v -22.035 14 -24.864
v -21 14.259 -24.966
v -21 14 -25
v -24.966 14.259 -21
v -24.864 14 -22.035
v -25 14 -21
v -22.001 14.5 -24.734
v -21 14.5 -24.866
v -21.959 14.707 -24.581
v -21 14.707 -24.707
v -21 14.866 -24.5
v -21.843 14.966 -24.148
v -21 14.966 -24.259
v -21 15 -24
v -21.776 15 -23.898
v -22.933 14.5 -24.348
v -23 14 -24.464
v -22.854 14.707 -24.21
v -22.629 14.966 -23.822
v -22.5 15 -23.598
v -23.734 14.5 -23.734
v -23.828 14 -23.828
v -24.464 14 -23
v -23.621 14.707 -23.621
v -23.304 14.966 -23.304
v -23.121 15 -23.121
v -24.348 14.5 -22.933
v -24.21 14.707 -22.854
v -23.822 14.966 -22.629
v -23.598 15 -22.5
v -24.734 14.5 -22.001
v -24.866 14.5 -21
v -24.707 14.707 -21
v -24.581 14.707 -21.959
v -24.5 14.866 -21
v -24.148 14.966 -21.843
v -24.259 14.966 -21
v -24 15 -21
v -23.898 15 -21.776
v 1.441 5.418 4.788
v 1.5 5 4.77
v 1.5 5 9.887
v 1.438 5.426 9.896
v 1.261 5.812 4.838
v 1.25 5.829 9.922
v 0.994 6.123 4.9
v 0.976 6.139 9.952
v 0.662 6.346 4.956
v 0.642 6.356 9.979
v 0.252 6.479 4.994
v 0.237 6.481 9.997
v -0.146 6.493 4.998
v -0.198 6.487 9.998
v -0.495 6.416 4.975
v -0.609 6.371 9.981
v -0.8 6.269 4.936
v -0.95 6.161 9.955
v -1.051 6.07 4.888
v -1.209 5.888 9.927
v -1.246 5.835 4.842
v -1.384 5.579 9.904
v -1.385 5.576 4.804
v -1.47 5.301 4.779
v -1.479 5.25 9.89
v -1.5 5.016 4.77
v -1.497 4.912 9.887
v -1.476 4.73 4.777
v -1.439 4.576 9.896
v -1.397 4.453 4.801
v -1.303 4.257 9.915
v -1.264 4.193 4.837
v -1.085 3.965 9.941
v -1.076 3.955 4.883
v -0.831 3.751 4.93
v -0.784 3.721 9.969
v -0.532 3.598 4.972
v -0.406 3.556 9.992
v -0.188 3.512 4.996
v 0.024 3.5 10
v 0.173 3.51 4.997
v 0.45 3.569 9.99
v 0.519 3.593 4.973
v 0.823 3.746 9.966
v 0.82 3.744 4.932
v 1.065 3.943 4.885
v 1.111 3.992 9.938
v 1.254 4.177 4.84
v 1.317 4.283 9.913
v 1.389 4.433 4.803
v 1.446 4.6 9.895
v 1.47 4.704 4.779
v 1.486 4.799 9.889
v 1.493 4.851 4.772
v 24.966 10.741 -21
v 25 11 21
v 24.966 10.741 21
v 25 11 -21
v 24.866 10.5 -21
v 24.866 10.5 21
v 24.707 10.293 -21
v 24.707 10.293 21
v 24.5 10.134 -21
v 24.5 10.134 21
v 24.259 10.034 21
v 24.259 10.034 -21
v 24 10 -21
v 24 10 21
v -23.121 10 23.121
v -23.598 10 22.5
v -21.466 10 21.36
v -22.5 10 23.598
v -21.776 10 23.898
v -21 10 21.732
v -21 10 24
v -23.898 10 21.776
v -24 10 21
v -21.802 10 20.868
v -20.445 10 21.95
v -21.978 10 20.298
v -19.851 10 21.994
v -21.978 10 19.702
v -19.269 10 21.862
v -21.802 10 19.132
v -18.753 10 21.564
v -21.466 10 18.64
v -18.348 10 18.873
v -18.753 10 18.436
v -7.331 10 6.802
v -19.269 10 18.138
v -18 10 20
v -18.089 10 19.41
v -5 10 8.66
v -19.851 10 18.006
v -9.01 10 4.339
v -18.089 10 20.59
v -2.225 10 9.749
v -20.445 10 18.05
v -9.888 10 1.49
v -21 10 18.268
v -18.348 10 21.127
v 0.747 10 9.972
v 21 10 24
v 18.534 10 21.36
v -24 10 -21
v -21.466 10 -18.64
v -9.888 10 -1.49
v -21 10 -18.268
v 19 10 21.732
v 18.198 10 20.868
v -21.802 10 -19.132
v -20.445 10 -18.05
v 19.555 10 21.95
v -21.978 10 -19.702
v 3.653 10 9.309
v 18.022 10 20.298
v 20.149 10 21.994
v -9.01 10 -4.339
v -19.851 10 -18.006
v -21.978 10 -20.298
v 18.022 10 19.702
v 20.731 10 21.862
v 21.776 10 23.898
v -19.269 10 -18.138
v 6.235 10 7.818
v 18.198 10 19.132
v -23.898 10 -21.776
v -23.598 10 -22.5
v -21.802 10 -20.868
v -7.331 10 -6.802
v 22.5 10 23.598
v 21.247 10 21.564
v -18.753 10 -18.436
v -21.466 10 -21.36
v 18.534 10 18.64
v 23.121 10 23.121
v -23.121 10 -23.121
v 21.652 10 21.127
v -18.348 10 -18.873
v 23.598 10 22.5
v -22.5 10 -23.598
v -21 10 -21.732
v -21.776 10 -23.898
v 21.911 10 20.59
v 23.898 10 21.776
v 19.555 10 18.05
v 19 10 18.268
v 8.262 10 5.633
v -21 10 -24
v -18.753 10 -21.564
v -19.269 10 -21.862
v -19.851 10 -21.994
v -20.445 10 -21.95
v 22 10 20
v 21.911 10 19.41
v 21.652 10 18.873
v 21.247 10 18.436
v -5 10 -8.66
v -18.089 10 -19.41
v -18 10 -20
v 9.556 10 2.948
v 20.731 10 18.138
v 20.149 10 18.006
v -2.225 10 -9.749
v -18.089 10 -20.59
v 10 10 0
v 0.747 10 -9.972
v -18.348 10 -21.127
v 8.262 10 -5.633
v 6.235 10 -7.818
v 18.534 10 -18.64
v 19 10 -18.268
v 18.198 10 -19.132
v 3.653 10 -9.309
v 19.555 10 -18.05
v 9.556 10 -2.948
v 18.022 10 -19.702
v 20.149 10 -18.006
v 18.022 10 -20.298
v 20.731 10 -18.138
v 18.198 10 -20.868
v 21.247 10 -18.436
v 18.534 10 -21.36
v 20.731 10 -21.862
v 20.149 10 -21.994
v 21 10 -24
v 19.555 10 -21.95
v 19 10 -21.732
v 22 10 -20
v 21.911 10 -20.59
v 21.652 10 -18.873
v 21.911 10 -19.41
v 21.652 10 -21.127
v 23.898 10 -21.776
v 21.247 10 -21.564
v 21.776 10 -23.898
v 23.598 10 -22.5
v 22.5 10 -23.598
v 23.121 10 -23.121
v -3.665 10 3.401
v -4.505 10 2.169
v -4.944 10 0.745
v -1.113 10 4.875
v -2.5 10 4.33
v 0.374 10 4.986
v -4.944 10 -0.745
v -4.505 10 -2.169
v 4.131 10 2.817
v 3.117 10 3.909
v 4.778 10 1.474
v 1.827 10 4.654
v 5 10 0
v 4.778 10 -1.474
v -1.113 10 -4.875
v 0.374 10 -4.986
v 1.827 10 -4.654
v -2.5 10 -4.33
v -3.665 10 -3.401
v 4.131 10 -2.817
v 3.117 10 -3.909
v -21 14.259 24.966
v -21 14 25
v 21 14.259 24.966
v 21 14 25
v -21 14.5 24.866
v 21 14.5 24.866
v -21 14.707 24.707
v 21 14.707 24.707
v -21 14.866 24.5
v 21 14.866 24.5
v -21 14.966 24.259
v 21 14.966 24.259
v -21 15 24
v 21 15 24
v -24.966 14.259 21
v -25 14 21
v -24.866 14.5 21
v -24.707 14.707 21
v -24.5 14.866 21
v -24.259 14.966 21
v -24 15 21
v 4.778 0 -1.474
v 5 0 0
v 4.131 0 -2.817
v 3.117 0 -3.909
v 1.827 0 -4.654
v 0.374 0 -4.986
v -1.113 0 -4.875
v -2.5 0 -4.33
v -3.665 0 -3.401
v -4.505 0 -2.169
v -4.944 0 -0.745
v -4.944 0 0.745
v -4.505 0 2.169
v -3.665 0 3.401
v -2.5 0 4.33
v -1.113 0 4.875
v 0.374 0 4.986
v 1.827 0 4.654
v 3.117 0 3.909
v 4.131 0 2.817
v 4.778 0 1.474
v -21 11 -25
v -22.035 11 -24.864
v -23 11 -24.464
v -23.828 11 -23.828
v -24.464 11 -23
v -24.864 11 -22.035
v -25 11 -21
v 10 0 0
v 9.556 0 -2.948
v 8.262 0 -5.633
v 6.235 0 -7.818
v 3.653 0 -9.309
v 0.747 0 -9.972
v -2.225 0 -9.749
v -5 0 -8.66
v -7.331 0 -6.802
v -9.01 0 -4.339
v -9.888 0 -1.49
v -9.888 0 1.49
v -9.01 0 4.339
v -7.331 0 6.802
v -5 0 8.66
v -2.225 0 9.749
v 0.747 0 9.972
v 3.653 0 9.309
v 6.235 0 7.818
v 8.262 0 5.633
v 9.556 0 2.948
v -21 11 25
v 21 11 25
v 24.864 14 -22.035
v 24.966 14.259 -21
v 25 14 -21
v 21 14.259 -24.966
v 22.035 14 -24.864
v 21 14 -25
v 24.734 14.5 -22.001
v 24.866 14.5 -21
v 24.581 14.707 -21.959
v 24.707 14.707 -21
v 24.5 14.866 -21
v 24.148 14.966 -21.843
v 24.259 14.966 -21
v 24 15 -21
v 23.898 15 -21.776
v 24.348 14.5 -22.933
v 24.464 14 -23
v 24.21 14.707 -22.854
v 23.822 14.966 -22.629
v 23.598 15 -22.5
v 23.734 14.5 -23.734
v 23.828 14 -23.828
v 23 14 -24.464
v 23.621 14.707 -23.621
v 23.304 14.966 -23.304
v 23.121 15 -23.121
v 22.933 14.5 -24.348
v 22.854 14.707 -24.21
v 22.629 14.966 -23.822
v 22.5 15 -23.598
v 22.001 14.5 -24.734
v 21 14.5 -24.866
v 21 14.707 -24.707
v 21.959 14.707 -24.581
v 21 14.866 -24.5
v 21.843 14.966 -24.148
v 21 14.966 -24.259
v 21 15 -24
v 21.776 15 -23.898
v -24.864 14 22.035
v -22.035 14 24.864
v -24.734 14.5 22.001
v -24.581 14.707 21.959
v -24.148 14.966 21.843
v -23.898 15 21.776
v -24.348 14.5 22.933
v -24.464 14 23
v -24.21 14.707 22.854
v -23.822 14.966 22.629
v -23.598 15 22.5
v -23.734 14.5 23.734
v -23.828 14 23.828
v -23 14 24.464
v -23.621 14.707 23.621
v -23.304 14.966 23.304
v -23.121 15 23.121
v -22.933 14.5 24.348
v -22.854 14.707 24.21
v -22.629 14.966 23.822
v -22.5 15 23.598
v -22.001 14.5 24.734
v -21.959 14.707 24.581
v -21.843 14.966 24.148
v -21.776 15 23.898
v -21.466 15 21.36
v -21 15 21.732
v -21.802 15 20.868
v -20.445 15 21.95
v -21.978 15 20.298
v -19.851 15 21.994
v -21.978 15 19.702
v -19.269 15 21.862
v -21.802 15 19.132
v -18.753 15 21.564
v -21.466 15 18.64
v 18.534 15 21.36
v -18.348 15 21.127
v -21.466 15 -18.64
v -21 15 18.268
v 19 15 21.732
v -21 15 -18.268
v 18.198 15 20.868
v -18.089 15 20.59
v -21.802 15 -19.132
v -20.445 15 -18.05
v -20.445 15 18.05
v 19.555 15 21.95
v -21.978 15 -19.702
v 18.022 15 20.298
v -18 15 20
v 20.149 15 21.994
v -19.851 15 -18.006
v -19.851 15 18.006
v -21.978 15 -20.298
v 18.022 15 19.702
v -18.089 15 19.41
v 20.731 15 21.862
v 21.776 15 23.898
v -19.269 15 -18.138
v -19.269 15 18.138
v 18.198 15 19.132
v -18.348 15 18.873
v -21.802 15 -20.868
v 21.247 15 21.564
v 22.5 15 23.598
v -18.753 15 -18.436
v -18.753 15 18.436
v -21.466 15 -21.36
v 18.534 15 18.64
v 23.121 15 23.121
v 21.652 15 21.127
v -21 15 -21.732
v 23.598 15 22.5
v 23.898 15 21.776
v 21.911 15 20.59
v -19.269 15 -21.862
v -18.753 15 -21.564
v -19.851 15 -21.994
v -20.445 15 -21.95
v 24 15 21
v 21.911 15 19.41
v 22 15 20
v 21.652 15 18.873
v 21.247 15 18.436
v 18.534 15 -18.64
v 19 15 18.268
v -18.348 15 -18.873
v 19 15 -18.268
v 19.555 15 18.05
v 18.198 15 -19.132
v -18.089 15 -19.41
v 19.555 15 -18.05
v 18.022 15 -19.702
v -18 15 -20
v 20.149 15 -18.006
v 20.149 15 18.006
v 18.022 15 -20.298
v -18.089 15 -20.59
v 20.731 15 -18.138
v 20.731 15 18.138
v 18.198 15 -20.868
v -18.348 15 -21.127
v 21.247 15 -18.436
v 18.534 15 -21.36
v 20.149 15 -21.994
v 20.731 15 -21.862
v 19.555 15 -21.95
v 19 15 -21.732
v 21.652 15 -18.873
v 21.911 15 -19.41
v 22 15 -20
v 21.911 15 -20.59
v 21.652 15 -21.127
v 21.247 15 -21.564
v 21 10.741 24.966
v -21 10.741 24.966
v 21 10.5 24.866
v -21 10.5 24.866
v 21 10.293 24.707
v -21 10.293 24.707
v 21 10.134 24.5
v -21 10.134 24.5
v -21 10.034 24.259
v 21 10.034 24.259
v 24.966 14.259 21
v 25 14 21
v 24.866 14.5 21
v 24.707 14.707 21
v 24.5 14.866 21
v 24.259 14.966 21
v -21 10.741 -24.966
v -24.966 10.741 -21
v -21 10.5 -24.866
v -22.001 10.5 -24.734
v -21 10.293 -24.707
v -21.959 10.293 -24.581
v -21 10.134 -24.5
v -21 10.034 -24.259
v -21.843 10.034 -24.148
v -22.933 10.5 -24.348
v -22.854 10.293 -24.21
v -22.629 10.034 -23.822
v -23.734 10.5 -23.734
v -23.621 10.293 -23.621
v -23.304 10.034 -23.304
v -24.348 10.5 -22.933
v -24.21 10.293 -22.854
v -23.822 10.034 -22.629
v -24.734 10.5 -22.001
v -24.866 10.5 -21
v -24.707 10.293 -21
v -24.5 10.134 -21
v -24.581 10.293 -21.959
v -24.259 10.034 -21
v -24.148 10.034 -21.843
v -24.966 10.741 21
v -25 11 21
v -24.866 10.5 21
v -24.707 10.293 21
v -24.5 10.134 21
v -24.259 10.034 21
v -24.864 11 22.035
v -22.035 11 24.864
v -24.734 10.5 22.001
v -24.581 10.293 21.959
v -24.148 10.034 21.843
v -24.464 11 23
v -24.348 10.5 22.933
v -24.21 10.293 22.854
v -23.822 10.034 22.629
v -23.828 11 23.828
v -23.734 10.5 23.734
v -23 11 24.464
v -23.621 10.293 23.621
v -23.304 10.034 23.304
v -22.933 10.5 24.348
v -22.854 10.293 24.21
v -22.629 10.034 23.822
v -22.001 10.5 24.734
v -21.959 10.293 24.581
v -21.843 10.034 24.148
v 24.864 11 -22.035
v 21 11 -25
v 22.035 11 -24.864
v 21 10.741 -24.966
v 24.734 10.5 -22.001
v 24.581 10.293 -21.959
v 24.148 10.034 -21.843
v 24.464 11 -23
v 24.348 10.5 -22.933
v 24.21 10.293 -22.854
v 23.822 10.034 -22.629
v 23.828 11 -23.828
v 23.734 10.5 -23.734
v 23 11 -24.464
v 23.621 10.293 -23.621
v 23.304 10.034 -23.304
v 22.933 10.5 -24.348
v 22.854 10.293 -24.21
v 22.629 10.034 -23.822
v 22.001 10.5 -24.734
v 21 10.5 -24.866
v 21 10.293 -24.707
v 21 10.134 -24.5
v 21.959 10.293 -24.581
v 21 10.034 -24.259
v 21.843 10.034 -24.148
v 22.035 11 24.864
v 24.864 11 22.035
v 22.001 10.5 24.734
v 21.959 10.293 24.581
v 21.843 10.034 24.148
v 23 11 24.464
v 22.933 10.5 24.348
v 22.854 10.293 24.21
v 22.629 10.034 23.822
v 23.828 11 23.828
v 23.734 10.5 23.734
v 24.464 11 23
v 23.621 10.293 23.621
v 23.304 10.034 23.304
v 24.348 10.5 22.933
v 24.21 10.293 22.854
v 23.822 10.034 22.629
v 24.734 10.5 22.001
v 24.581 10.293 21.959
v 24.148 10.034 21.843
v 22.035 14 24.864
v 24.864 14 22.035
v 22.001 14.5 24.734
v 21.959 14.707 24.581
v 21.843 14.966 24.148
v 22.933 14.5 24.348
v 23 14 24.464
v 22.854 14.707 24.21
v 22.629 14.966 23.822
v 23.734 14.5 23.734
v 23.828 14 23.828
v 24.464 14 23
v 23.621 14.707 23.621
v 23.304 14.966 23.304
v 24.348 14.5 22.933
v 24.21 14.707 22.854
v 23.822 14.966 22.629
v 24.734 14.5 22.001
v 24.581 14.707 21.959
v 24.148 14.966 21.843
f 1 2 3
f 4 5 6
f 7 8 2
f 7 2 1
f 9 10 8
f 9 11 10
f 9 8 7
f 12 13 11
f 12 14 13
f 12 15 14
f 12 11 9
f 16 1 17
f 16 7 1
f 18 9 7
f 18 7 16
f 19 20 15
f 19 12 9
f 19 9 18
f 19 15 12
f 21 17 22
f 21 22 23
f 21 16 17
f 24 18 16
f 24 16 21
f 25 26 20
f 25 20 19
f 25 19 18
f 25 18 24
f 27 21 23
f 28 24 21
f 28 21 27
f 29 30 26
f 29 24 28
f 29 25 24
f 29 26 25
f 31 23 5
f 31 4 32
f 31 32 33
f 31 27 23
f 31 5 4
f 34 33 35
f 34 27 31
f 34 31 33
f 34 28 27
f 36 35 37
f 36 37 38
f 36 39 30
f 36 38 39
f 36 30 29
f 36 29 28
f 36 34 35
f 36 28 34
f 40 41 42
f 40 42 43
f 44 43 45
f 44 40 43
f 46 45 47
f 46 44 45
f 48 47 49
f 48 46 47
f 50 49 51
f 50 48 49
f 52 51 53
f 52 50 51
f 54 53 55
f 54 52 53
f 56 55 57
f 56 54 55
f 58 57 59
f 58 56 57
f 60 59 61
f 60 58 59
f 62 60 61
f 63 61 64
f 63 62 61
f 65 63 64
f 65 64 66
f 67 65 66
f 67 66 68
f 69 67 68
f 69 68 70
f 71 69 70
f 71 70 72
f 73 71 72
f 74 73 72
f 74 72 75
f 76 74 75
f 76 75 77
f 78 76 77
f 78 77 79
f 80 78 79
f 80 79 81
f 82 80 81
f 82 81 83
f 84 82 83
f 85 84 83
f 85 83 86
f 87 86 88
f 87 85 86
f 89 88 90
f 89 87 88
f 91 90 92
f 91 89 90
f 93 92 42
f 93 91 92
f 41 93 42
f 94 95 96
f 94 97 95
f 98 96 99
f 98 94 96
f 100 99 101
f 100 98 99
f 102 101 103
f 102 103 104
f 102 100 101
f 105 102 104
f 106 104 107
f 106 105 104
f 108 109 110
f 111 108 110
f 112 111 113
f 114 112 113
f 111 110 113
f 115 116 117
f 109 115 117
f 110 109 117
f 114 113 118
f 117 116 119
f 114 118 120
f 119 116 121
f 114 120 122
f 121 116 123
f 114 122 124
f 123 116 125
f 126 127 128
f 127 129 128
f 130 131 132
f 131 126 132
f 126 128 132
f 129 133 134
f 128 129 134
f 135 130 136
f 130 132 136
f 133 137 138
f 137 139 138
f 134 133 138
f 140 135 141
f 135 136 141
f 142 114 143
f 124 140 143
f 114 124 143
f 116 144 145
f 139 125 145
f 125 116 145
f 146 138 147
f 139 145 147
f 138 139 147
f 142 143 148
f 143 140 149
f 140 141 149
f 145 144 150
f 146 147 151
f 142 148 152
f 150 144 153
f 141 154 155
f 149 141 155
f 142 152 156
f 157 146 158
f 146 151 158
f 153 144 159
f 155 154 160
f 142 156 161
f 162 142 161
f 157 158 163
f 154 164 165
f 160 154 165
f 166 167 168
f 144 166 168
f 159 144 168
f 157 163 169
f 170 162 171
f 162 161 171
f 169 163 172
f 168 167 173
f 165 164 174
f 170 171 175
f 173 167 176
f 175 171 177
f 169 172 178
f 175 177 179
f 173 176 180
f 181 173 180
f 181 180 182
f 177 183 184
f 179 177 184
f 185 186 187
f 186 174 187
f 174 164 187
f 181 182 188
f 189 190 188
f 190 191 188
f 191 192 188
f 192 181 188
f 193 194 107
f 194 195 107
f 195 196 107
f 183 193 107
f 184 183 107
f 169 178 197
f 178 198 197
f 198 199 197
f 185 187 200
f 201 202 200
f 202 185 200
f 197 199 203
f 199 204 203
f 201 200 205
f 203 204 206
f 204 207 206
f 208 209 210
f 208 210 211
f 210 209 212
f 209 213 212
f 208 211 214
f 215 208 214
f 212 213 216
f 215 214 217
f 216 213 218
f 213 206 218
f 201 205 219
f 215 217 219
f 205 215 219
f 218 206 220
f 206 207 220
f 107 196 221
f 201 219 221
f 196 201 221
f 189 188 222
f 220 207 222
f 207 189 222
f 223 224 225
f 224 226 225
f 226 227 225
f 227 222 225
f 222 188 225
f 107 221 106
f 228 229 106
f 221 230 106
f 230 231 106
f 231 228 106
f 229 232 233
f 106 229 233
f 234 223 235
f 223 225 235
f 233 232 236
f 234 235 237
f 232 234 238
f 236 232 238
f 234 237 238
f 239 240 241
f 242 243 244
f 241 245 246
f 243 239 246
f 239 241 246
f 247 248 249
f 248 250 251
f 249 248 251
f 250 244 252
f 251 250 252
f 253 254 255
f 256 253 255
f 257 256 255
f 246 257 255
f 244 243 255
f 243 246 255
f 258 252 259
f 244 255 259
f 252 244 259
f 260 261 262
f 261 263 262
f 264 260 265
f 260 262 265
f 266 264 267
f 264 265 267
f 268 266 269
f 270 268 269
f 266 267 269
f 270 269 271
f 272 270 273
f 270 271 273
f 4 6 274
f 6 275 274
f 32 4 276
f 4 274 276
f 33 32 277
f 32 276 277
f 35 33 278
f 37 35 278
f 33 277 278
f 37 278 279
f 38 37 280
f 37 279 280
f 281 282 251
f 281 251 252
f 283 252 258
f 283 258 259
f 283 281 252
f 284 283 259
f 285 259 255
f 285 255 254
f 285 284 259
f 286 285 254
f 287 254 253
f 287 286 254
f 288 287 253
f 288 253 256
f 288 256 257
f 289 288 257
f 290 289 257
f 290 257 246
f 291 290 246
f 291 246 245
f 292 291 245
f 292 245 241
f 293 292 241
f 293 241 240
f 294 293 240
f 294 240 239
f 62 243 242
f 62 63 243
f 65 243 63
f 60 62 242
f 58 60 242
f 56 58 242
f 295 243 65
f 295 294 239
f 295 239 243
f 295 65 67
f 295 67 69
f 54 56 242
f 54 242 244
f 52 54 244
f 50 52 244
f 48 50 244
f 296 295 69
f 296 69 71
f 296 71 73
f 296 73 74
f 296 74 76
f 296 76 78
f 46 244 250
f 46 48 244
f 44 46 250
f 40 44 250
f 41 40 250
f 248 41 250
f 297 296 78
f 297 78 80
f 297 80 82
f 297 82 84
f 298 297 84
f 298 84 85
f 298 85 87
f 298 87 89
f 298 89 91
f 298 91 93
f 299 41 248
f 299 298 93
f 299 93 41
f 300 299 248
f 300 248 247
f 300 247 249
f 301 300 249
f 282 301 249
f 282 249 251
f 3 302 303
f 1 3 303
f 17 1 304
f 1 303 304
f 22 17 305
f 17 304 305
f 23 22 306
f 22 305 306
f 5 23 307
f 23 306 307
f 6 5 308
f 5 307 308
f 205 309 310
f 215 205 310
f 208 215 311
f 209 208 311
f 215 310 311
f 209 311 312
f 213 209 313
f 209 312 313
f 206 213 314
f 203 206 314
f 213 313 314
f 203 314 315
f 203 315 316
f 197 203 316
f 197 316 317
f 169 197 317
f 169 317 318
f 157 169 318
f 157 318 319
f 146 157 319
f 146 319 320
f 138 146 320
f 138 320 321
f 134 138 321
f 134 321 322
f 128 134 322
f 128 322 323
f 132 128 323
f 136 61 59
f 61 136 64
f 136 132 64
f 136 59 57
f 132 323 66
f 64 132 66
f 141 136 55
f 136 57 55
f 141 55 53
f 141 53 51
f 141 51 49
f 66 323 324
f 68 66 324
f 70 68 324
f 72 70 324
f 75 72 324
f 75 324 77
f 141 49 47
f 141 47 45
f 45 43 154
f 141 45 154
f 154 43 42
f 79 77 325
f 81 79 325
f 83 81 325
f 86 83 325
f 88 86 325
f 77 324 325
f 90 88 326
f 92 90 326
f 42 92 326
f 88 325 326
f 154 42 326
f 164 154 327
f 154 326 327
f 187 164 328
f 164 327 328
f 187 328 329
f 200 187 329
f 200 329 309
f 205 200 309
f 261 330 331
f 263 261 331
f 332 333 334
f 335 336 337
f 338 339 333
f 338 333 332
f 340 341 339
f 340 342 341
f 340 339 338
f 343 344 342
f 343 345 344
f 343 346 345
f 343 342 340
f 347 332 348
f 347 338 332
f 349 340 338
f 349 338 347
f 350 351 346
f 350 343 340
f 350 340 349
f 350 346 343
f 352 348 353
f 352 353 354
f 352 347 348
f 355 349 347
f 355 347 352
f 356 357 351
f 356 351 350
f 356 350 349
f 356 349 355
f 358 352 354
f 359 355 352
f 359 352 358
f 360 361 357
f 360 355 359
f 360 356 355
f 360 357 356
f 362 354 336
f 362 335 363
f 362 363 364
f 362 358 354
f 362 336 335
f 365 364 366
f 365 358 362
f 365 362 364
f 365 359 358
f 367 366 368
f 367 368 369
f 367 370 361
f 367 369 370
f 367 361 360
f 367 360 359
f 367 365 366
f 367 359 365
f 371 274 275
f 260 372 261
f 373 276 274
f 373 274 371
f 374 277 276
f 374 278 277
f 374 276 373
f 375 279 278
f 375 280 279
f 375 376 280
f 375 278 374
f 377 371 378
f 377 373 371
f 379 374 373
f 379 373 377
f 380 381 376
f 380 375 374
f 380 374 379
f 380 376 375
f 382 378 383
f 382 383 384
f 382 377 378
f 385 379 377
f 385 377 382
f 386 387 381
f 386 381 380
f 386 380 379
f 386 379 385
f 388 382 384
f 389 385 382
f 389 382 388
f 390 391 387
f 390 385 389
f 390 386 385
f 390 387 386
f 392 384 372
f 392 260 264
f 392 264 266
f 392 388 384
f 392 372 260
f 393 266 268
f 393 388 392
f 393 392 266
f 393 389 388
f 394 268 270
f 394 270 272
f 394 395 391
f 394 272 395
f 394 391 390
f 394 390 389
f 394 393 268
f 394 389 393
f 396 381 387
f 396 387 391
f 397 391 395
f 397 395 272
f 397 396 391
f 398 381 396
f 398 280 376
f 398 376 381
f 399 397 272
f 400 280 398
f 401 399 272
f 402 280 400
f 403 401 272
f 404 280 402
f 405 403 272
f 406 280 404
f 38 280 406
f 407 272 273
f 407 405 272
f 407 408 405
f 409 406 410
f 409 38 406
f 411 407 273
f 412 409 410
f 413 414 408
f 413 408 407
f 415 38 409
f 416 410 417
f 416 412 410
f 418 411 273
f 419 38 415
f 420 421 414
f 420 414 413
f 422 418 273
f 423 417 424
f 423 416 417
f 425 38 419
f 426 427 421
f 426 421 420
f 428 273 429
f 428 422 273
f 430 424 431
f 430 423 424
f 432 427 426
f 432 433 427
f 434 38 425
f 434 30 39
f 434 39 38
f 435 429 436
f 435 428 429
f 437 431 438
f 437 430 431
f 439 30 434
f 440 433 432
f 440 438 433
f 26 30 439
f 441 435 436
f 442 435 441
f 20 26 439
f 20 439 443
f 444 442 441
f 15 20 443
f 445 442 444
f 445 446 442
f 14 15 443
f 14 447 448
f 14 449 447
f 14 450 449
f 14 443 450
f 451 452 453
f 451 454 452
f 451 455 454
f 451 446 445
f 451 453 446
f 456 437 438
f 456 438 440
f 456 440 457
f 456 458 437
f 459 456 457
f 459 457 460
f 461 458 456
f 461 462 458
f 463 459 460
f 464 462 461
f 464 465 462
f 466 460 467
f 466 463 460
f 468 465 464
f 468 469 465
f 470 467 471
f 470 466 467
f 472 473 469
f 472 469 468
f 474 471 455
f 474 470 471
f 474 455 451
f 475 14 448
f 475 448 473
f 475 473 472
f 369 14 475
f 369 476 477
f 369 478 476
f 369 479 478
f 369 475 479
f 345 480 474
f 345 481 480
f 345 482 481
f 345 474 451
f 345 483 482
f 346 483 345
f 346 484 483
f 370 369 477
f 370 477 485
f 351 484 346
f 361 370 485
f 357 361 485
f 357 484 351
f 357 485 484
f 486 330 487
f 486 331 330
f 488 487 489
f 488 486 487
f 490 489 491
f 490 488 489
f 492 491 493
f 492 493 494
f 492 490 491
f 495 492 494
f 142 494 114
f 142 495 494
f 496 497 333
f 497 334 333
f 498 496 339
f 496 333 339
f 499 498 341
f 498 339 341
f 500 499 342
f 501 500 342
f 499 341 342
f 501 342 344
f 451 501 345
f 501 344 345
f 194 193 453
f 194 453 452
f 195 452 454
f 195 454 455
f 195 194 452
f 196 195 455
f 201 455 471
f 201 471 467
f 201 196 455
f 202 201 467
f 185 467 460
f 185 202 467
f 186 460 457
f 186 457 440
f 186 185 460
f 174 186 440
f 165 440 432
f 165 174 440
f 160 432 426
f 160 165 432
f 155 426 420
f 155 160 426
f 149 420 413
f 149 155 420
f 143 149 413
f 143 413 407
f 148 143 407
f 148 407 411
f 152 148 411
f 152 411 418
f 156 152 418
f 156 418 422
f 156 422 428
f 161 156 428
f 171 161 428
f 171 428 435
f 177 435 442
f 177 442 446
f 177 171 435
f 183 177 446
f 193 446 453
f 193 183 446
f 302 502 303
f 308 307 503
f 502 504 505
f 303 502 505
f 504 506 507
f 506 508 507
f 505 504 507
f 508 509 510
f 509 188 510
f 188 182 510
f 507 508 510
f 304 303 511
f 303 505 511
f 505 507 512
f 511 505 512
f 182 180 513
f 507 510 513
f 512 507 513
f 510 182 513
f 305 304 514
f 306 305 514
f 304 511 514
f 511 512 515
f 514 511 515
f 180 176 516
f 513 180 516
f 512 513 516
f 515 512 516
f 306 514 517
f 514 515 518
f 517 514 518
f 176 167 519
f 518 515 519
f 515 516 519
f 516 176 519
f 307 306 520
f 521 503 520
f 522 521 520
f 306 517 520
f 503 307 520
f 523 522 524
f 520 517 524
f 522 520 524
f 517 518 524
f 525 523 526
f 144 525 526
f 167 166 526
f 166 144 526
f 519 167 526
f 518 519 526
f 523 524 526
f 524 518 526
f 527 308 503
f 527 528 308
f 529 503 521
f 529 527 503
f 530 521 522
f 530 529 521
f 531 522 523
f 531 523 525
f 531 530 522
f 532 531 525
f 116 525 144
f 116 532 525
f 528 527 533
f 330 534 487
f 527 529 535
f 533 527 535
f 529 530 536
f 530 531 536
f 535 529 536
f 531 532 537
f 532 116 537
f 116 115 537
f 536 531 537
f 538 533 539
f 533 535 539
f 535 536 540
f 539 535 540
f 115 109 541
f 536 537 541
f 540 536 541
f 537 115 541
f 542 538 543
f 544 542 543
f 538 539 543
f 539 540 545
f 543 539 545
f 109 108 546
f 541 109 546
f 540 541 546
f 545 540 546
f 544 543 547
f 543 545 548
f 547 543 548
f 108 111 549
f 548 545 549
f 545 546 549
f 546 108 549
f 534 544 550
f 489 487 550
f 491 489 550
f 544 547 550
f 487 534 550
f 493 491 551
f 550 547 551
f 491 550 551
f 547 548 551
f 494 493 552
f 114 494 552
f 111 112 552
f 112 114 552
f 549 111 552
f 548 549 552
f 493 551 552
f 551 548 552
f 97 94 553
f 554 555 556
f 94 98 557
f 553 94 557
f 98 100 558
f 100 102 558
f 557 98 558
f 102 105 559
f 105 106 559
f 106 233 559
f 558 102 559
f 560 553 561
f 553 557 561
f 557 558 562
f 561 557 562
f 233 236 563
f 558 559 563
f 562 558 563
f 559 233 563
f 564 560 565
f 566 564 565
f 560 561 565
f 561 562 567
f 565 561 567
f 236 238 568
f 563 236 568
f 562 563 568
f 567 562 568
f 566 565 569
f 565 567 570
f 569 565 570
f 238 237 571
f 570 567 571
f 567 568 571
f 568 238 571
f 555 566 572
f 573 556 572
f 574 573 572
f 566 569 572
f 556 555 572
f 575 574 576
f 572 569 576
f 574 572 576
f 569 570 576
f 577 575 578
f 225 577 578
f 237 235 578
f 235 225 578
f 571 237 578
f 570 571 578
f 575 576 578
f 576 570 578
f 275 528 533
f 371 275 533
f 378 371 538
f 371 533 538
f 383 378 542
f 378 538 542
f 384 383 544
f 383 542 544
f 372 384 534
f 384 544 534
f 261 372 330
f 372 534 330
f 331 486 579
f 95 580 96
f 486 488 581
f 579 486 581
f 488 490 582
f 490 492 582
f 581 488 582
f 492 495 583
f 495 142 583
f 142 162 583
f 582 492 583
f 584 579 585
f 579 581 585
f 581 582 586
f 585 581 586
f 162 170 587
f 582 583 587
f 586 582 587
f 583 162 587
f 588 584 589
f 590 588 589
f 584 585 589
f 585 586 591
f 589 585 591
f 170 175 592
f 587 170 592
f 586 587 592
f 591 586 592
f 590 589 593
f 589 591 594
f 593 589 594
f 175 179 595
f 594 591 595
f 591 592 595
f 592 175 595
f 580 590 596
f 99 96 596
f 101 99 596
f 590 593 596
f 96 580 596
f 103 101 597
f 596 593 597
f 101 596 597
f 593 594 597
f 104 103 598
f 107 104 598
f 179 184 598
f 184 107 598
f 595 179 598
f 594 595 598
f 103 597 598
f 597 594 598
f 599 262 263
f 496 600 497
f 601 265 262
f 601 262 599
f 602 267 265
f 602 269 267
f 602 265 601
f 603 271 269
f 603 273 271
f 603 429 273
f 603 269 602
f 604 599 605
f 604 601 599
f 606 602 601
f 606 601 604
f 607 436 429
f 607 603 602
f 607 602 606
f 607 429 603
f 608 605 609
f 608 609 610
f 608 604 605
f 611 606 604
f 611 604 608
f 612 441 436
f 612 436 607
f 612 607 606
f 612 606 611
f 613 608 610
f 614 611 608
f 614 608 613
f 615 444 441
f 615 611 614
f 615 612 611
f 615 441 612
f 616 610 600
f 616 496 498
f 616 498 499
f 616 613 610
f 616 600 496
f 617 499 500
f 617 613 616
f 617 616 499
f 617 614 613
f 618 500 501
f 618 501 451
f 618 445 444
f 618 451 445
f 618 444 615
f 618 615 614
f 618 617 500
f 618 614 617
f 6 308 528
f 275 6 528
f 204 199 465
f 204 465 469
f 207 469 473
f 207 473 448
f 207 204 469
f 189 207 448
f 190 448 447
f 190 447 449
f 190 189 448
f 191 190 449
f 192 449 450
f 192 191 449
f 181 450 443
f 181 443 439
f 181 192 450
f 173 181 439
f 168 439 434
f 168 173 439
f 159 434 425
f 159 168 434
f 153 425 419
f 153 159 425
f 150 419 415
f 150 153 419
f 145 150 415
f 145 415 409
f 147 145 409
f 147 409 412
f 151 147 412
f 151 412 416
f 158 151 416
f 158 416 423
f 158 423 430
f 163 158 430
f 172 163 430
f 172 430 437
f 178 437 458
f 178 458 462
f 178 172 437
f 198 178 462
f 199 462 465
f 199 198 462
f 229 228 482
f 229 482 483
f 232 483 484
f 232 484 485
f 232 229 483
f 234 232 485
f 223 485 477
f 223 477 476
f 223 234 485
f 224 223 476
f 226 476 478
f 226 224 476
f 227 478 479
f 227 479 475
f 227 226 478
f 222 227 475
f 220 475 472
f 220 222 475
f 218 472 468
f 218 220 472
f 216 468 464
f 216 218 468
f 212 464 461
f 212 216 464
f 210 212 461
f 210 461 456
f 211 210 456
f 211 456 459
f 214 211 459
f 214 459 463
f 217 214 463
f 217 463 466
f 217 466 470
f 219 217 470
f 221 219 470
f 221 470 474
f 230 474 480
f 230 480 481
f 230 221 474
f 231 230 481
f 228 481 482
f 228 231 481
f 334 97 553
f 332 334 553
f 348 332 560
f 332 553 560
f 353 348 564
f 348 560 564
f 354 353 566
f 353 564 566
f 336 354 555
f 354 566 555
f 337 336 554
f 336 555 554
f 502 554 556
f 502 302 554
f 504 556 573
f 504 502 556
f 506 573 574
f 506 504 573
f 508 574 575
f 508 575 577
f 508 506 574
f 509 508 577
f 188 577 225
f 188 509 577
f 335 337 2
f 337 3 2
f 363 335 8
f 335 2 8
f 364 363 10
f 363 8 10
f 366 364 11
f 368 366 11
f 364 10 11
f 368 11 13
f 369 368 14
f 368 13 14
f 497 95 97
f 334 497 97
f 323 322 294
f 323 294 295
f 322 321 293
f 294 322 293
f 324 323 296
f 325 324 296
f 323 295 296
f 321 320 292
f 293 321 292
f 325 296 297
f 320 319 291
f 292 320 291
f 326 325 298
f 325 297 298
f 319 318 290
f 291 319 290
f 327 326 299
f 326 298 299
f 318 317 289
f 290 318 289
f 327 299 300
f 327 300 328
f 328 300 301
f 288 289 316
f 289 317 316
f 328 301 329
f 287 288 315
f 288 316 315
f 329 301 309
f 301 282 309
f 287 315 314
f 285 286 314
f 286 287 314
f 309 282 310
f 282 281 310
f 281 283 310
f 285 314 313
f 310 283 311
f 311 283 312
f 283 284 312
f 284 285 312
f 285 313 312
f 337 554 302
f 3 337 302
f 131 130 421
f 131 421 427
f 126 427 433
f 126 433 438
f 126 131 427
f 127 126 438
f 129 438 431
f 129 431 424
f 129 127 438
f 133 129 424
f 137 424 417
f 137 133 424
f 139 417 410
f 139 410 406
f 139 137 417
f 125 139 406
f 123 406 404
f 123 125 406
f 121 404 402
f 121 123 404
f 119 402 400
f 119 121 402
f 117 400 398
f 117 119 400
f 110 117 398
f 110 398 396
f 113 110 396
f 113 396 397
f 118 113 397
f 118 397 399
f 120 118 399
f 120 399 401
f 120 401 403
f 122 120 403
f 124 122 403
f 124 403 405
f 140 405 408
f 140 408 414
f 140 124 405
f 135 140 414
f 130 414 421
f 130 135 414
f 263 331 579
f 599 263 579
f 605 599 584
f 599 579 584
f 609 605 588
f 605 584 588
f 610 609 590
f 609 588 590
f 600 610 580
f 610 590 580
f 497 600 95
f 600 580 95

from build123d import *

# Parameters (mm, degrees)
SKETCH1_R           = 10
SKETCH1_R_2         = 5
BOSS_EXTRUDE1_DEPTH = 10
SKETCH2_R           = 2
BOSS_EXTRUDE2_DEPTH = 5
SKETCH3_R           = 1.5
CUT_EXTRUDE1_DEPTH  = 26
FILLET1_R           = 1


with BuildPart() as part:
    # Sketch1 → Boss-Extrude1 (new body)
    with BuildSketch(Plane(origin=(0, 0, 0), x_dir=(1, 0, 0), z_dir=(0, 1, 0))):
        Circle(SKETCH1_R)
        Circle(SKETCH1_R_2, mode=Mode.SUBTRACT)
    extrude(amount=BOSS_EXTRUDE1_DEPTH)

    # Sketch2 → Boss-Extrude2 (add)
    with BuildSketch(Plane(origin=(0, 10, 0), x_dir=(1, 0, 0), z_dir=(0, 1, 0))):
        with BuildLine():
            Line((-21, -25), (21, -25))
            ThreePointArc((21, -25), (23.828427125, -23.828427125), (25, -21))
            Line((25, -21), (25, 21))
            ThreePointArc((25, 21), (23.828427125, 23.828427125), (21, 25))
            Line((21, 25), (-21, 25))
            ThreePointArc((-21, 25), (-23.828427125, 23.828427125), (-25, 21))
            Line((-25, 21), (-25, -21))
            ThreePointArc((-25, -21), (-23.828427125, -23.828427125), (-21, -25))
        make_face()
        with Locations((-20, 20)):
            Circle(SKETCH2_R, mode=Mode.SUBTRACT)
        with Locations((20, 20)):
            Circle(SKETCH2_R, mode=Mode.SUBTRACT)
        with Locations((20, -20)):
            Circle(SKETCH2_R, mode=Mode.SUBTRACT)
        with Locations((-20, -20)):
            Circle(SKETCH2_R, mode=Mode.SUBTRACT)
    extrude(amount=BOSS_EXTRUDE2_DEPTH)

    # Sketch3 → Cut-Extrude1 (cut, through all)
    with BuildSketch(Plane.XY):
        with Locations((0, 5)):
            Circle(SKETCH3_R)
    extrude(amount=CUT_EXTRUDE1_DEPTH, mode=Mode.SUBTRACT)

    # Fillet1
    fillet1_edges = [part.edges().sort_by_distance(p)[0] for p in [
        (0, 15, 25),
        (23.828427125, 15, 23.828427125),
        (25, 15, 0),
        (23.828427125, 15, -23.828427125),
        (0, 15, -25),
        (-23.828427125, 15, -23.828427125),
        (-25, 15, 0),
        (-23.828427125, 10, 23.828427125),
        (0, 10, 25),
        (23.828427125, 10, 23.828427125),
        (25, 10, 0),
        (23.828427125, 10, -23.828427125),
        (0, 10, -25),
        (-23.828427125, 10, -23.828427125),
        (-25, 10, 0),
        (-23.828427125, 15, 23.828427125),
    ]]
    fillet(fillet1_edges, radius=FILLET1_R)


solid = part.part
